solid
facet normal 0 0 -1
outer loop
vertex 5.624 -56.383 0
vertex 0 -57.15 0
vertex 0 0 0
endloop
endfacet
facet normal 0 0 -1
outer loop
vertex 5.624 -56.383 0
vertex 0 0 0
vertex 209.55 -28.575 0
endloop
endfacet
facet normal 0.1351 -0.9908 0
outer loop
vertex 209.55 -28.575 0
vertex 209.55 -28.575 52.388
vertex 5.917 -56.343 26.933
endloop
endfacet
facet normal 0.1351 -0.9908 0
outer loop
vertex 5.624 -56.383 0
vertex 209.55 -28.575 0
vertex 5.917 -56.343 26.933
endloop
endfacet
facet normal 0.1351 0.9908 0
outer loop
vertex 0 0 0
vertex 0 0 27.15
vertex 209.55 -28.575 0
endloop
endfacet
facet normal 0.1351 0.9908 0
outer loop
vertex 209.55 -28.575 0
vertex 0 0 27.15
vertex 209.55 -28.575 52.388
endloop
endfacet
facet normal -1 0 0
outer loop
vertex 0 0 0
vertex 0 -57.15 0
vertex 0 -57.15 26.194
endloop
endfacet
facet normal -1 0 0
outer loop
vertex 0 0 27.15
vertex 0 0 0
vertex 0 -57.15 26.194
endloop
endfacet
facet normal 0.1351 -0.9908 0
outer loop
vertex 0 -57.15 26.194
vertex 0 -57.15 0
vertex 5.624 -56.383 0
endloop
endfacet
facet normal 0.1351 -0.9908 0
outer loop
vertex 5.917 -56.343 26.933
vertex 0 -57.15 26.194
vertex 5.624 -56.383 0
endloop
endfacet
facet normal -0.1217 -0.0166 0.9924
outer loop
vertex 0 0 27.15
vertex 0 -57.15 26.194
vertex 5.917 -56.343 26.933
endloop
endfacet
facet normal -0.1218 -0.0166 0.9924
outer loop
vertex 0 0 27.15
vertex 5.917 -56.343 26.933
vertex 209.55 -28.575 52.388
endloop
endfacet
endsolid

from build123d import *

# Parameters (mm, degrees)
F0_W     = 209.55
F0_H     = 52.3875
F1_DEPTH = 57.15
F3_DEPTH = 76.2
F5_DEPTH = 76.2
F7_DEPTH = 72.644
F9_DEPTH = 19.304


with BuildPart() as f1:
    # F0 (on Front) → F1 (new body)
    with BuildSketch(Plane.XZ):
        with Locations((104.775, 26.19375)):
            Rectangle(F0_W, F0_H)
    extrude(amount=F1_DEPTH)

    # F2 (on face) → F3 (cut)
    with BuildSketch(Plane.XY.offset(52.3875)):
        Polygon((209.55, -57.15), (209.55, -28.575), (0, -57.15), align=None)
    extrude(amount=-F3_DEPTH, mode=Mode.SUBTRACT)

    # F4 (on face) → F5 (cut)
    with BuildSketch(Plane.XY.offset(52.3875)):
        Polygon((0, 0), (209.55, -28.575), (209.55, 0), align=None)
    extrude(amount=-F5_DEPTH, mode=Mode.SUBTRACT)

    # F6 (on face) → F7 (cut)
    with BuildSketch(Plane(origin=(7.650913, -56.106694, 0), x_dir=(0.99083, 0.135113, 0), z_dir=(0.135113, -0.99083, 0))):
        Polygon((-7.72172, 26.19375), (203.767602, 52.3875), (-7.72172, 52.3875), align=None)
    extrude(amount=-F7_DEPTH, mode=Mode.SUBTRACT)

    # F8 (on face) → F9 (cut)
    with BuildSketch(Plane(origin=(7.650913, -56.106694, 0), x_dir=(0.99083, 0.135113, 0), z_dir=(0.135113, -0.99083, 0))):
        Polygon((203.767602, 52.3875), (-7.72172, 26.19375), (-7.72172, 0), (203.767602, 0), align=None)
        Polygon((-7.72172, 0), (-7.72172, 26.19375), (-25.226625, 0), align=None)
    extrude(amount=F9_DEPTH, mode=Mode.SUBTRACT)


solid = f1.part
